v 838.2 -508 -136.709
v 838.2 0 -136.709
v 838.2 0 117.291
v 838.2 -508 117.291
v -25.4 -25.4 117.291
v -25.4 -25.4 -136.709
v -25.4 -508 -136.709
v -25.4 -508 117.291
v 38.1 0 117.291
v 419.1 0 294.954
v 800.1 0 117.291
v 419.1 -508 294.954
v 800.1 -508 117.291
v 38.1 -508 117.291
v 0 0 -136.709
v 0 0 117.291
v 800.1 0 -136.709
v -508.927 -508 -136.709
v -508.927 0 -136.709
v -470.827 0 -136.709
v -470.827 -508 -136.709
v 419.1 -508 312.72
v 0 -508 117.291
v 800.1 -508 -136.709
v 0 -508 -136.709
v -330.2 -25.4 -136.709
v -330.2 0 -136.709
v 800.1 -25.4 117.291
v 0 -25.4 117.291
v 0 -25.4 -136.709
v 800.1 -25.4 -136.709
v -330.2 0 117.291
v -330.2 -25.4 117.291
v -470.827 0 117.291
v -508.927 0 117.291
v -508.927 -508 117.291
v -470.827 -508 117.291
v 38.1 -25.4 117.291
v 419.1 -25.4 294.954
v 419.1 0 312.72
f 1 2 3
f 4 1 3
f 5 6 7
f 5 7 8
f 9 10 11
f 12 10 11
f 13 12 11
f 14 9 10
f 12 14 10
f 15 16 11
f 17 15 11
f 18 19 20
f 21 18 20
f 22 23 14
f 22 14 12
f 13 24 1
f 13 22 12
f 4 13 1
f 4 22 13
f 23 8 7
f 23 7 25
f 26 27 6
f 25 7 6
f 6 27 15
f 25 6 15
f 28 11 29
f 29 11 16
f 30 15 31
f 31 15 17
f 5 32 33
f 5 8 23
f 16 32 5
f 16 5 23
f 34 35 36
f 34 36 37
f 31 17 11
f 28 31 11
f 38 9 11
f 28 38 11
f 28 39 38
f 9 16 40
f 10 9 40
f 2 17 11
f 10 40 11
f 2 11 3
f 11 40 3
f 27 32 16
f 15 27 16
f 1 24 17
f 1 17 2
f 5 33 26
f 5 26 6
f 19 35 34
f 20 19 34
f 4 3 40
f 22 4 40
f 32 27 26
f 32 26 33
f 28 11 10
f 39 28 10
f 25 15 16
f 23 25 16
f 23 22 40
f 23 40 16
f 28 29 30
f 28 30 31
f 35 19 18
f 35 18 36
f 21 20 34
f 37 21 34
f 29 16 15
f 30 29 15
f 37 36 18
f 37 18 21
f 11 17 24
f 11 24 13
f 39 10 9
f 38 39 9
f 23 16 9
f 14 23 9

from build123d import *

# Parameters (mm, degrees)
F0_W     = 25.4
F0_H     = 254
F1_DEPTH = 508
F0_W_2   = 38.1
F2_DEPTH = 508
F3_DEPTH = 508
F4_DEPTH = 25.4
F5_DEPTH = 25.4
F0_W_3   = 304.8
F6_DEPTH = 25.4
F7_DEPTH = 508


with BuildPart() as f1:
    # F0 (on Front) → F1 (new body)
    with BuildSketch(Plane.XZ):
        with Locations((-12.7, -9.709484)):
            Rectangle(F0_W, F0_H)
    extrude(amount=F1_DEPTH)



with BuildPart() as f2:
    # F0 (on Front) → F2 (new body)
    with BuildSketch(Plane.XZ):
        with Locations((819.15, -9.709484)):
            Rectangle(F0_W_2, F0_H)
    extrude(amount=F2_DEPTH)


with BuildPart() as f1_1:
    add(f1.part)

    add(f2.part)  # F3 merges F2
    # F0 (on Front) → F3 (join)
    with BuildSketch(Plane.XZ):
        Polygon((419.1, 312.720056), (0, 117.290516), (38.1, 117.290516), (419.1, 294.953734), (800.1, 117.290516), (838.2, 117.290516), align=None)
    extrude(amount=F3_DEPTH)

    # F0 (on Front) → F6 (join)
    with BuildSketch(Plane.XZ):
        with Locations((-177.8, -9.709484)):
            Rectangle(F0_W_3, F0_H)
    extrude(amount=F6_DEPTH)


with BuildPart() as f4:
    # F0 (on Front) → F4 (new body)
    with BuildSketch(Plane.XZ):
        Polygon((38.1, 117.290516), (0, 117.290516), (0, -136.709484), (76.2, -136.709484), (800.1, -136.709484), (800.1, 117.290516), align=None)
    extrude(amount=F4_DEPTH)


with BuildPart() as f5:
    # F0 (on Front) → F5 (new body)
    with BuildSketch(Plane.XZ):
        Polygon((419.1, 294.953734), (38.1, 117.290516), (800.1, 117.290516), align=None)
    extrude(amount=F5_DEPTH)


with BuildPart() as f7:
    # F0 (on Front) → F7 (new body)
    with BuildSketch(Plane.XZ):
        with Locations((-489.876588, -9.709484)):
            Rectangle(F0_W_2, F0_H)
    extrude(amount=F7_DEPTH)


solid = Compound([f1_1.part, f4.part, f5.part, f7.part])
